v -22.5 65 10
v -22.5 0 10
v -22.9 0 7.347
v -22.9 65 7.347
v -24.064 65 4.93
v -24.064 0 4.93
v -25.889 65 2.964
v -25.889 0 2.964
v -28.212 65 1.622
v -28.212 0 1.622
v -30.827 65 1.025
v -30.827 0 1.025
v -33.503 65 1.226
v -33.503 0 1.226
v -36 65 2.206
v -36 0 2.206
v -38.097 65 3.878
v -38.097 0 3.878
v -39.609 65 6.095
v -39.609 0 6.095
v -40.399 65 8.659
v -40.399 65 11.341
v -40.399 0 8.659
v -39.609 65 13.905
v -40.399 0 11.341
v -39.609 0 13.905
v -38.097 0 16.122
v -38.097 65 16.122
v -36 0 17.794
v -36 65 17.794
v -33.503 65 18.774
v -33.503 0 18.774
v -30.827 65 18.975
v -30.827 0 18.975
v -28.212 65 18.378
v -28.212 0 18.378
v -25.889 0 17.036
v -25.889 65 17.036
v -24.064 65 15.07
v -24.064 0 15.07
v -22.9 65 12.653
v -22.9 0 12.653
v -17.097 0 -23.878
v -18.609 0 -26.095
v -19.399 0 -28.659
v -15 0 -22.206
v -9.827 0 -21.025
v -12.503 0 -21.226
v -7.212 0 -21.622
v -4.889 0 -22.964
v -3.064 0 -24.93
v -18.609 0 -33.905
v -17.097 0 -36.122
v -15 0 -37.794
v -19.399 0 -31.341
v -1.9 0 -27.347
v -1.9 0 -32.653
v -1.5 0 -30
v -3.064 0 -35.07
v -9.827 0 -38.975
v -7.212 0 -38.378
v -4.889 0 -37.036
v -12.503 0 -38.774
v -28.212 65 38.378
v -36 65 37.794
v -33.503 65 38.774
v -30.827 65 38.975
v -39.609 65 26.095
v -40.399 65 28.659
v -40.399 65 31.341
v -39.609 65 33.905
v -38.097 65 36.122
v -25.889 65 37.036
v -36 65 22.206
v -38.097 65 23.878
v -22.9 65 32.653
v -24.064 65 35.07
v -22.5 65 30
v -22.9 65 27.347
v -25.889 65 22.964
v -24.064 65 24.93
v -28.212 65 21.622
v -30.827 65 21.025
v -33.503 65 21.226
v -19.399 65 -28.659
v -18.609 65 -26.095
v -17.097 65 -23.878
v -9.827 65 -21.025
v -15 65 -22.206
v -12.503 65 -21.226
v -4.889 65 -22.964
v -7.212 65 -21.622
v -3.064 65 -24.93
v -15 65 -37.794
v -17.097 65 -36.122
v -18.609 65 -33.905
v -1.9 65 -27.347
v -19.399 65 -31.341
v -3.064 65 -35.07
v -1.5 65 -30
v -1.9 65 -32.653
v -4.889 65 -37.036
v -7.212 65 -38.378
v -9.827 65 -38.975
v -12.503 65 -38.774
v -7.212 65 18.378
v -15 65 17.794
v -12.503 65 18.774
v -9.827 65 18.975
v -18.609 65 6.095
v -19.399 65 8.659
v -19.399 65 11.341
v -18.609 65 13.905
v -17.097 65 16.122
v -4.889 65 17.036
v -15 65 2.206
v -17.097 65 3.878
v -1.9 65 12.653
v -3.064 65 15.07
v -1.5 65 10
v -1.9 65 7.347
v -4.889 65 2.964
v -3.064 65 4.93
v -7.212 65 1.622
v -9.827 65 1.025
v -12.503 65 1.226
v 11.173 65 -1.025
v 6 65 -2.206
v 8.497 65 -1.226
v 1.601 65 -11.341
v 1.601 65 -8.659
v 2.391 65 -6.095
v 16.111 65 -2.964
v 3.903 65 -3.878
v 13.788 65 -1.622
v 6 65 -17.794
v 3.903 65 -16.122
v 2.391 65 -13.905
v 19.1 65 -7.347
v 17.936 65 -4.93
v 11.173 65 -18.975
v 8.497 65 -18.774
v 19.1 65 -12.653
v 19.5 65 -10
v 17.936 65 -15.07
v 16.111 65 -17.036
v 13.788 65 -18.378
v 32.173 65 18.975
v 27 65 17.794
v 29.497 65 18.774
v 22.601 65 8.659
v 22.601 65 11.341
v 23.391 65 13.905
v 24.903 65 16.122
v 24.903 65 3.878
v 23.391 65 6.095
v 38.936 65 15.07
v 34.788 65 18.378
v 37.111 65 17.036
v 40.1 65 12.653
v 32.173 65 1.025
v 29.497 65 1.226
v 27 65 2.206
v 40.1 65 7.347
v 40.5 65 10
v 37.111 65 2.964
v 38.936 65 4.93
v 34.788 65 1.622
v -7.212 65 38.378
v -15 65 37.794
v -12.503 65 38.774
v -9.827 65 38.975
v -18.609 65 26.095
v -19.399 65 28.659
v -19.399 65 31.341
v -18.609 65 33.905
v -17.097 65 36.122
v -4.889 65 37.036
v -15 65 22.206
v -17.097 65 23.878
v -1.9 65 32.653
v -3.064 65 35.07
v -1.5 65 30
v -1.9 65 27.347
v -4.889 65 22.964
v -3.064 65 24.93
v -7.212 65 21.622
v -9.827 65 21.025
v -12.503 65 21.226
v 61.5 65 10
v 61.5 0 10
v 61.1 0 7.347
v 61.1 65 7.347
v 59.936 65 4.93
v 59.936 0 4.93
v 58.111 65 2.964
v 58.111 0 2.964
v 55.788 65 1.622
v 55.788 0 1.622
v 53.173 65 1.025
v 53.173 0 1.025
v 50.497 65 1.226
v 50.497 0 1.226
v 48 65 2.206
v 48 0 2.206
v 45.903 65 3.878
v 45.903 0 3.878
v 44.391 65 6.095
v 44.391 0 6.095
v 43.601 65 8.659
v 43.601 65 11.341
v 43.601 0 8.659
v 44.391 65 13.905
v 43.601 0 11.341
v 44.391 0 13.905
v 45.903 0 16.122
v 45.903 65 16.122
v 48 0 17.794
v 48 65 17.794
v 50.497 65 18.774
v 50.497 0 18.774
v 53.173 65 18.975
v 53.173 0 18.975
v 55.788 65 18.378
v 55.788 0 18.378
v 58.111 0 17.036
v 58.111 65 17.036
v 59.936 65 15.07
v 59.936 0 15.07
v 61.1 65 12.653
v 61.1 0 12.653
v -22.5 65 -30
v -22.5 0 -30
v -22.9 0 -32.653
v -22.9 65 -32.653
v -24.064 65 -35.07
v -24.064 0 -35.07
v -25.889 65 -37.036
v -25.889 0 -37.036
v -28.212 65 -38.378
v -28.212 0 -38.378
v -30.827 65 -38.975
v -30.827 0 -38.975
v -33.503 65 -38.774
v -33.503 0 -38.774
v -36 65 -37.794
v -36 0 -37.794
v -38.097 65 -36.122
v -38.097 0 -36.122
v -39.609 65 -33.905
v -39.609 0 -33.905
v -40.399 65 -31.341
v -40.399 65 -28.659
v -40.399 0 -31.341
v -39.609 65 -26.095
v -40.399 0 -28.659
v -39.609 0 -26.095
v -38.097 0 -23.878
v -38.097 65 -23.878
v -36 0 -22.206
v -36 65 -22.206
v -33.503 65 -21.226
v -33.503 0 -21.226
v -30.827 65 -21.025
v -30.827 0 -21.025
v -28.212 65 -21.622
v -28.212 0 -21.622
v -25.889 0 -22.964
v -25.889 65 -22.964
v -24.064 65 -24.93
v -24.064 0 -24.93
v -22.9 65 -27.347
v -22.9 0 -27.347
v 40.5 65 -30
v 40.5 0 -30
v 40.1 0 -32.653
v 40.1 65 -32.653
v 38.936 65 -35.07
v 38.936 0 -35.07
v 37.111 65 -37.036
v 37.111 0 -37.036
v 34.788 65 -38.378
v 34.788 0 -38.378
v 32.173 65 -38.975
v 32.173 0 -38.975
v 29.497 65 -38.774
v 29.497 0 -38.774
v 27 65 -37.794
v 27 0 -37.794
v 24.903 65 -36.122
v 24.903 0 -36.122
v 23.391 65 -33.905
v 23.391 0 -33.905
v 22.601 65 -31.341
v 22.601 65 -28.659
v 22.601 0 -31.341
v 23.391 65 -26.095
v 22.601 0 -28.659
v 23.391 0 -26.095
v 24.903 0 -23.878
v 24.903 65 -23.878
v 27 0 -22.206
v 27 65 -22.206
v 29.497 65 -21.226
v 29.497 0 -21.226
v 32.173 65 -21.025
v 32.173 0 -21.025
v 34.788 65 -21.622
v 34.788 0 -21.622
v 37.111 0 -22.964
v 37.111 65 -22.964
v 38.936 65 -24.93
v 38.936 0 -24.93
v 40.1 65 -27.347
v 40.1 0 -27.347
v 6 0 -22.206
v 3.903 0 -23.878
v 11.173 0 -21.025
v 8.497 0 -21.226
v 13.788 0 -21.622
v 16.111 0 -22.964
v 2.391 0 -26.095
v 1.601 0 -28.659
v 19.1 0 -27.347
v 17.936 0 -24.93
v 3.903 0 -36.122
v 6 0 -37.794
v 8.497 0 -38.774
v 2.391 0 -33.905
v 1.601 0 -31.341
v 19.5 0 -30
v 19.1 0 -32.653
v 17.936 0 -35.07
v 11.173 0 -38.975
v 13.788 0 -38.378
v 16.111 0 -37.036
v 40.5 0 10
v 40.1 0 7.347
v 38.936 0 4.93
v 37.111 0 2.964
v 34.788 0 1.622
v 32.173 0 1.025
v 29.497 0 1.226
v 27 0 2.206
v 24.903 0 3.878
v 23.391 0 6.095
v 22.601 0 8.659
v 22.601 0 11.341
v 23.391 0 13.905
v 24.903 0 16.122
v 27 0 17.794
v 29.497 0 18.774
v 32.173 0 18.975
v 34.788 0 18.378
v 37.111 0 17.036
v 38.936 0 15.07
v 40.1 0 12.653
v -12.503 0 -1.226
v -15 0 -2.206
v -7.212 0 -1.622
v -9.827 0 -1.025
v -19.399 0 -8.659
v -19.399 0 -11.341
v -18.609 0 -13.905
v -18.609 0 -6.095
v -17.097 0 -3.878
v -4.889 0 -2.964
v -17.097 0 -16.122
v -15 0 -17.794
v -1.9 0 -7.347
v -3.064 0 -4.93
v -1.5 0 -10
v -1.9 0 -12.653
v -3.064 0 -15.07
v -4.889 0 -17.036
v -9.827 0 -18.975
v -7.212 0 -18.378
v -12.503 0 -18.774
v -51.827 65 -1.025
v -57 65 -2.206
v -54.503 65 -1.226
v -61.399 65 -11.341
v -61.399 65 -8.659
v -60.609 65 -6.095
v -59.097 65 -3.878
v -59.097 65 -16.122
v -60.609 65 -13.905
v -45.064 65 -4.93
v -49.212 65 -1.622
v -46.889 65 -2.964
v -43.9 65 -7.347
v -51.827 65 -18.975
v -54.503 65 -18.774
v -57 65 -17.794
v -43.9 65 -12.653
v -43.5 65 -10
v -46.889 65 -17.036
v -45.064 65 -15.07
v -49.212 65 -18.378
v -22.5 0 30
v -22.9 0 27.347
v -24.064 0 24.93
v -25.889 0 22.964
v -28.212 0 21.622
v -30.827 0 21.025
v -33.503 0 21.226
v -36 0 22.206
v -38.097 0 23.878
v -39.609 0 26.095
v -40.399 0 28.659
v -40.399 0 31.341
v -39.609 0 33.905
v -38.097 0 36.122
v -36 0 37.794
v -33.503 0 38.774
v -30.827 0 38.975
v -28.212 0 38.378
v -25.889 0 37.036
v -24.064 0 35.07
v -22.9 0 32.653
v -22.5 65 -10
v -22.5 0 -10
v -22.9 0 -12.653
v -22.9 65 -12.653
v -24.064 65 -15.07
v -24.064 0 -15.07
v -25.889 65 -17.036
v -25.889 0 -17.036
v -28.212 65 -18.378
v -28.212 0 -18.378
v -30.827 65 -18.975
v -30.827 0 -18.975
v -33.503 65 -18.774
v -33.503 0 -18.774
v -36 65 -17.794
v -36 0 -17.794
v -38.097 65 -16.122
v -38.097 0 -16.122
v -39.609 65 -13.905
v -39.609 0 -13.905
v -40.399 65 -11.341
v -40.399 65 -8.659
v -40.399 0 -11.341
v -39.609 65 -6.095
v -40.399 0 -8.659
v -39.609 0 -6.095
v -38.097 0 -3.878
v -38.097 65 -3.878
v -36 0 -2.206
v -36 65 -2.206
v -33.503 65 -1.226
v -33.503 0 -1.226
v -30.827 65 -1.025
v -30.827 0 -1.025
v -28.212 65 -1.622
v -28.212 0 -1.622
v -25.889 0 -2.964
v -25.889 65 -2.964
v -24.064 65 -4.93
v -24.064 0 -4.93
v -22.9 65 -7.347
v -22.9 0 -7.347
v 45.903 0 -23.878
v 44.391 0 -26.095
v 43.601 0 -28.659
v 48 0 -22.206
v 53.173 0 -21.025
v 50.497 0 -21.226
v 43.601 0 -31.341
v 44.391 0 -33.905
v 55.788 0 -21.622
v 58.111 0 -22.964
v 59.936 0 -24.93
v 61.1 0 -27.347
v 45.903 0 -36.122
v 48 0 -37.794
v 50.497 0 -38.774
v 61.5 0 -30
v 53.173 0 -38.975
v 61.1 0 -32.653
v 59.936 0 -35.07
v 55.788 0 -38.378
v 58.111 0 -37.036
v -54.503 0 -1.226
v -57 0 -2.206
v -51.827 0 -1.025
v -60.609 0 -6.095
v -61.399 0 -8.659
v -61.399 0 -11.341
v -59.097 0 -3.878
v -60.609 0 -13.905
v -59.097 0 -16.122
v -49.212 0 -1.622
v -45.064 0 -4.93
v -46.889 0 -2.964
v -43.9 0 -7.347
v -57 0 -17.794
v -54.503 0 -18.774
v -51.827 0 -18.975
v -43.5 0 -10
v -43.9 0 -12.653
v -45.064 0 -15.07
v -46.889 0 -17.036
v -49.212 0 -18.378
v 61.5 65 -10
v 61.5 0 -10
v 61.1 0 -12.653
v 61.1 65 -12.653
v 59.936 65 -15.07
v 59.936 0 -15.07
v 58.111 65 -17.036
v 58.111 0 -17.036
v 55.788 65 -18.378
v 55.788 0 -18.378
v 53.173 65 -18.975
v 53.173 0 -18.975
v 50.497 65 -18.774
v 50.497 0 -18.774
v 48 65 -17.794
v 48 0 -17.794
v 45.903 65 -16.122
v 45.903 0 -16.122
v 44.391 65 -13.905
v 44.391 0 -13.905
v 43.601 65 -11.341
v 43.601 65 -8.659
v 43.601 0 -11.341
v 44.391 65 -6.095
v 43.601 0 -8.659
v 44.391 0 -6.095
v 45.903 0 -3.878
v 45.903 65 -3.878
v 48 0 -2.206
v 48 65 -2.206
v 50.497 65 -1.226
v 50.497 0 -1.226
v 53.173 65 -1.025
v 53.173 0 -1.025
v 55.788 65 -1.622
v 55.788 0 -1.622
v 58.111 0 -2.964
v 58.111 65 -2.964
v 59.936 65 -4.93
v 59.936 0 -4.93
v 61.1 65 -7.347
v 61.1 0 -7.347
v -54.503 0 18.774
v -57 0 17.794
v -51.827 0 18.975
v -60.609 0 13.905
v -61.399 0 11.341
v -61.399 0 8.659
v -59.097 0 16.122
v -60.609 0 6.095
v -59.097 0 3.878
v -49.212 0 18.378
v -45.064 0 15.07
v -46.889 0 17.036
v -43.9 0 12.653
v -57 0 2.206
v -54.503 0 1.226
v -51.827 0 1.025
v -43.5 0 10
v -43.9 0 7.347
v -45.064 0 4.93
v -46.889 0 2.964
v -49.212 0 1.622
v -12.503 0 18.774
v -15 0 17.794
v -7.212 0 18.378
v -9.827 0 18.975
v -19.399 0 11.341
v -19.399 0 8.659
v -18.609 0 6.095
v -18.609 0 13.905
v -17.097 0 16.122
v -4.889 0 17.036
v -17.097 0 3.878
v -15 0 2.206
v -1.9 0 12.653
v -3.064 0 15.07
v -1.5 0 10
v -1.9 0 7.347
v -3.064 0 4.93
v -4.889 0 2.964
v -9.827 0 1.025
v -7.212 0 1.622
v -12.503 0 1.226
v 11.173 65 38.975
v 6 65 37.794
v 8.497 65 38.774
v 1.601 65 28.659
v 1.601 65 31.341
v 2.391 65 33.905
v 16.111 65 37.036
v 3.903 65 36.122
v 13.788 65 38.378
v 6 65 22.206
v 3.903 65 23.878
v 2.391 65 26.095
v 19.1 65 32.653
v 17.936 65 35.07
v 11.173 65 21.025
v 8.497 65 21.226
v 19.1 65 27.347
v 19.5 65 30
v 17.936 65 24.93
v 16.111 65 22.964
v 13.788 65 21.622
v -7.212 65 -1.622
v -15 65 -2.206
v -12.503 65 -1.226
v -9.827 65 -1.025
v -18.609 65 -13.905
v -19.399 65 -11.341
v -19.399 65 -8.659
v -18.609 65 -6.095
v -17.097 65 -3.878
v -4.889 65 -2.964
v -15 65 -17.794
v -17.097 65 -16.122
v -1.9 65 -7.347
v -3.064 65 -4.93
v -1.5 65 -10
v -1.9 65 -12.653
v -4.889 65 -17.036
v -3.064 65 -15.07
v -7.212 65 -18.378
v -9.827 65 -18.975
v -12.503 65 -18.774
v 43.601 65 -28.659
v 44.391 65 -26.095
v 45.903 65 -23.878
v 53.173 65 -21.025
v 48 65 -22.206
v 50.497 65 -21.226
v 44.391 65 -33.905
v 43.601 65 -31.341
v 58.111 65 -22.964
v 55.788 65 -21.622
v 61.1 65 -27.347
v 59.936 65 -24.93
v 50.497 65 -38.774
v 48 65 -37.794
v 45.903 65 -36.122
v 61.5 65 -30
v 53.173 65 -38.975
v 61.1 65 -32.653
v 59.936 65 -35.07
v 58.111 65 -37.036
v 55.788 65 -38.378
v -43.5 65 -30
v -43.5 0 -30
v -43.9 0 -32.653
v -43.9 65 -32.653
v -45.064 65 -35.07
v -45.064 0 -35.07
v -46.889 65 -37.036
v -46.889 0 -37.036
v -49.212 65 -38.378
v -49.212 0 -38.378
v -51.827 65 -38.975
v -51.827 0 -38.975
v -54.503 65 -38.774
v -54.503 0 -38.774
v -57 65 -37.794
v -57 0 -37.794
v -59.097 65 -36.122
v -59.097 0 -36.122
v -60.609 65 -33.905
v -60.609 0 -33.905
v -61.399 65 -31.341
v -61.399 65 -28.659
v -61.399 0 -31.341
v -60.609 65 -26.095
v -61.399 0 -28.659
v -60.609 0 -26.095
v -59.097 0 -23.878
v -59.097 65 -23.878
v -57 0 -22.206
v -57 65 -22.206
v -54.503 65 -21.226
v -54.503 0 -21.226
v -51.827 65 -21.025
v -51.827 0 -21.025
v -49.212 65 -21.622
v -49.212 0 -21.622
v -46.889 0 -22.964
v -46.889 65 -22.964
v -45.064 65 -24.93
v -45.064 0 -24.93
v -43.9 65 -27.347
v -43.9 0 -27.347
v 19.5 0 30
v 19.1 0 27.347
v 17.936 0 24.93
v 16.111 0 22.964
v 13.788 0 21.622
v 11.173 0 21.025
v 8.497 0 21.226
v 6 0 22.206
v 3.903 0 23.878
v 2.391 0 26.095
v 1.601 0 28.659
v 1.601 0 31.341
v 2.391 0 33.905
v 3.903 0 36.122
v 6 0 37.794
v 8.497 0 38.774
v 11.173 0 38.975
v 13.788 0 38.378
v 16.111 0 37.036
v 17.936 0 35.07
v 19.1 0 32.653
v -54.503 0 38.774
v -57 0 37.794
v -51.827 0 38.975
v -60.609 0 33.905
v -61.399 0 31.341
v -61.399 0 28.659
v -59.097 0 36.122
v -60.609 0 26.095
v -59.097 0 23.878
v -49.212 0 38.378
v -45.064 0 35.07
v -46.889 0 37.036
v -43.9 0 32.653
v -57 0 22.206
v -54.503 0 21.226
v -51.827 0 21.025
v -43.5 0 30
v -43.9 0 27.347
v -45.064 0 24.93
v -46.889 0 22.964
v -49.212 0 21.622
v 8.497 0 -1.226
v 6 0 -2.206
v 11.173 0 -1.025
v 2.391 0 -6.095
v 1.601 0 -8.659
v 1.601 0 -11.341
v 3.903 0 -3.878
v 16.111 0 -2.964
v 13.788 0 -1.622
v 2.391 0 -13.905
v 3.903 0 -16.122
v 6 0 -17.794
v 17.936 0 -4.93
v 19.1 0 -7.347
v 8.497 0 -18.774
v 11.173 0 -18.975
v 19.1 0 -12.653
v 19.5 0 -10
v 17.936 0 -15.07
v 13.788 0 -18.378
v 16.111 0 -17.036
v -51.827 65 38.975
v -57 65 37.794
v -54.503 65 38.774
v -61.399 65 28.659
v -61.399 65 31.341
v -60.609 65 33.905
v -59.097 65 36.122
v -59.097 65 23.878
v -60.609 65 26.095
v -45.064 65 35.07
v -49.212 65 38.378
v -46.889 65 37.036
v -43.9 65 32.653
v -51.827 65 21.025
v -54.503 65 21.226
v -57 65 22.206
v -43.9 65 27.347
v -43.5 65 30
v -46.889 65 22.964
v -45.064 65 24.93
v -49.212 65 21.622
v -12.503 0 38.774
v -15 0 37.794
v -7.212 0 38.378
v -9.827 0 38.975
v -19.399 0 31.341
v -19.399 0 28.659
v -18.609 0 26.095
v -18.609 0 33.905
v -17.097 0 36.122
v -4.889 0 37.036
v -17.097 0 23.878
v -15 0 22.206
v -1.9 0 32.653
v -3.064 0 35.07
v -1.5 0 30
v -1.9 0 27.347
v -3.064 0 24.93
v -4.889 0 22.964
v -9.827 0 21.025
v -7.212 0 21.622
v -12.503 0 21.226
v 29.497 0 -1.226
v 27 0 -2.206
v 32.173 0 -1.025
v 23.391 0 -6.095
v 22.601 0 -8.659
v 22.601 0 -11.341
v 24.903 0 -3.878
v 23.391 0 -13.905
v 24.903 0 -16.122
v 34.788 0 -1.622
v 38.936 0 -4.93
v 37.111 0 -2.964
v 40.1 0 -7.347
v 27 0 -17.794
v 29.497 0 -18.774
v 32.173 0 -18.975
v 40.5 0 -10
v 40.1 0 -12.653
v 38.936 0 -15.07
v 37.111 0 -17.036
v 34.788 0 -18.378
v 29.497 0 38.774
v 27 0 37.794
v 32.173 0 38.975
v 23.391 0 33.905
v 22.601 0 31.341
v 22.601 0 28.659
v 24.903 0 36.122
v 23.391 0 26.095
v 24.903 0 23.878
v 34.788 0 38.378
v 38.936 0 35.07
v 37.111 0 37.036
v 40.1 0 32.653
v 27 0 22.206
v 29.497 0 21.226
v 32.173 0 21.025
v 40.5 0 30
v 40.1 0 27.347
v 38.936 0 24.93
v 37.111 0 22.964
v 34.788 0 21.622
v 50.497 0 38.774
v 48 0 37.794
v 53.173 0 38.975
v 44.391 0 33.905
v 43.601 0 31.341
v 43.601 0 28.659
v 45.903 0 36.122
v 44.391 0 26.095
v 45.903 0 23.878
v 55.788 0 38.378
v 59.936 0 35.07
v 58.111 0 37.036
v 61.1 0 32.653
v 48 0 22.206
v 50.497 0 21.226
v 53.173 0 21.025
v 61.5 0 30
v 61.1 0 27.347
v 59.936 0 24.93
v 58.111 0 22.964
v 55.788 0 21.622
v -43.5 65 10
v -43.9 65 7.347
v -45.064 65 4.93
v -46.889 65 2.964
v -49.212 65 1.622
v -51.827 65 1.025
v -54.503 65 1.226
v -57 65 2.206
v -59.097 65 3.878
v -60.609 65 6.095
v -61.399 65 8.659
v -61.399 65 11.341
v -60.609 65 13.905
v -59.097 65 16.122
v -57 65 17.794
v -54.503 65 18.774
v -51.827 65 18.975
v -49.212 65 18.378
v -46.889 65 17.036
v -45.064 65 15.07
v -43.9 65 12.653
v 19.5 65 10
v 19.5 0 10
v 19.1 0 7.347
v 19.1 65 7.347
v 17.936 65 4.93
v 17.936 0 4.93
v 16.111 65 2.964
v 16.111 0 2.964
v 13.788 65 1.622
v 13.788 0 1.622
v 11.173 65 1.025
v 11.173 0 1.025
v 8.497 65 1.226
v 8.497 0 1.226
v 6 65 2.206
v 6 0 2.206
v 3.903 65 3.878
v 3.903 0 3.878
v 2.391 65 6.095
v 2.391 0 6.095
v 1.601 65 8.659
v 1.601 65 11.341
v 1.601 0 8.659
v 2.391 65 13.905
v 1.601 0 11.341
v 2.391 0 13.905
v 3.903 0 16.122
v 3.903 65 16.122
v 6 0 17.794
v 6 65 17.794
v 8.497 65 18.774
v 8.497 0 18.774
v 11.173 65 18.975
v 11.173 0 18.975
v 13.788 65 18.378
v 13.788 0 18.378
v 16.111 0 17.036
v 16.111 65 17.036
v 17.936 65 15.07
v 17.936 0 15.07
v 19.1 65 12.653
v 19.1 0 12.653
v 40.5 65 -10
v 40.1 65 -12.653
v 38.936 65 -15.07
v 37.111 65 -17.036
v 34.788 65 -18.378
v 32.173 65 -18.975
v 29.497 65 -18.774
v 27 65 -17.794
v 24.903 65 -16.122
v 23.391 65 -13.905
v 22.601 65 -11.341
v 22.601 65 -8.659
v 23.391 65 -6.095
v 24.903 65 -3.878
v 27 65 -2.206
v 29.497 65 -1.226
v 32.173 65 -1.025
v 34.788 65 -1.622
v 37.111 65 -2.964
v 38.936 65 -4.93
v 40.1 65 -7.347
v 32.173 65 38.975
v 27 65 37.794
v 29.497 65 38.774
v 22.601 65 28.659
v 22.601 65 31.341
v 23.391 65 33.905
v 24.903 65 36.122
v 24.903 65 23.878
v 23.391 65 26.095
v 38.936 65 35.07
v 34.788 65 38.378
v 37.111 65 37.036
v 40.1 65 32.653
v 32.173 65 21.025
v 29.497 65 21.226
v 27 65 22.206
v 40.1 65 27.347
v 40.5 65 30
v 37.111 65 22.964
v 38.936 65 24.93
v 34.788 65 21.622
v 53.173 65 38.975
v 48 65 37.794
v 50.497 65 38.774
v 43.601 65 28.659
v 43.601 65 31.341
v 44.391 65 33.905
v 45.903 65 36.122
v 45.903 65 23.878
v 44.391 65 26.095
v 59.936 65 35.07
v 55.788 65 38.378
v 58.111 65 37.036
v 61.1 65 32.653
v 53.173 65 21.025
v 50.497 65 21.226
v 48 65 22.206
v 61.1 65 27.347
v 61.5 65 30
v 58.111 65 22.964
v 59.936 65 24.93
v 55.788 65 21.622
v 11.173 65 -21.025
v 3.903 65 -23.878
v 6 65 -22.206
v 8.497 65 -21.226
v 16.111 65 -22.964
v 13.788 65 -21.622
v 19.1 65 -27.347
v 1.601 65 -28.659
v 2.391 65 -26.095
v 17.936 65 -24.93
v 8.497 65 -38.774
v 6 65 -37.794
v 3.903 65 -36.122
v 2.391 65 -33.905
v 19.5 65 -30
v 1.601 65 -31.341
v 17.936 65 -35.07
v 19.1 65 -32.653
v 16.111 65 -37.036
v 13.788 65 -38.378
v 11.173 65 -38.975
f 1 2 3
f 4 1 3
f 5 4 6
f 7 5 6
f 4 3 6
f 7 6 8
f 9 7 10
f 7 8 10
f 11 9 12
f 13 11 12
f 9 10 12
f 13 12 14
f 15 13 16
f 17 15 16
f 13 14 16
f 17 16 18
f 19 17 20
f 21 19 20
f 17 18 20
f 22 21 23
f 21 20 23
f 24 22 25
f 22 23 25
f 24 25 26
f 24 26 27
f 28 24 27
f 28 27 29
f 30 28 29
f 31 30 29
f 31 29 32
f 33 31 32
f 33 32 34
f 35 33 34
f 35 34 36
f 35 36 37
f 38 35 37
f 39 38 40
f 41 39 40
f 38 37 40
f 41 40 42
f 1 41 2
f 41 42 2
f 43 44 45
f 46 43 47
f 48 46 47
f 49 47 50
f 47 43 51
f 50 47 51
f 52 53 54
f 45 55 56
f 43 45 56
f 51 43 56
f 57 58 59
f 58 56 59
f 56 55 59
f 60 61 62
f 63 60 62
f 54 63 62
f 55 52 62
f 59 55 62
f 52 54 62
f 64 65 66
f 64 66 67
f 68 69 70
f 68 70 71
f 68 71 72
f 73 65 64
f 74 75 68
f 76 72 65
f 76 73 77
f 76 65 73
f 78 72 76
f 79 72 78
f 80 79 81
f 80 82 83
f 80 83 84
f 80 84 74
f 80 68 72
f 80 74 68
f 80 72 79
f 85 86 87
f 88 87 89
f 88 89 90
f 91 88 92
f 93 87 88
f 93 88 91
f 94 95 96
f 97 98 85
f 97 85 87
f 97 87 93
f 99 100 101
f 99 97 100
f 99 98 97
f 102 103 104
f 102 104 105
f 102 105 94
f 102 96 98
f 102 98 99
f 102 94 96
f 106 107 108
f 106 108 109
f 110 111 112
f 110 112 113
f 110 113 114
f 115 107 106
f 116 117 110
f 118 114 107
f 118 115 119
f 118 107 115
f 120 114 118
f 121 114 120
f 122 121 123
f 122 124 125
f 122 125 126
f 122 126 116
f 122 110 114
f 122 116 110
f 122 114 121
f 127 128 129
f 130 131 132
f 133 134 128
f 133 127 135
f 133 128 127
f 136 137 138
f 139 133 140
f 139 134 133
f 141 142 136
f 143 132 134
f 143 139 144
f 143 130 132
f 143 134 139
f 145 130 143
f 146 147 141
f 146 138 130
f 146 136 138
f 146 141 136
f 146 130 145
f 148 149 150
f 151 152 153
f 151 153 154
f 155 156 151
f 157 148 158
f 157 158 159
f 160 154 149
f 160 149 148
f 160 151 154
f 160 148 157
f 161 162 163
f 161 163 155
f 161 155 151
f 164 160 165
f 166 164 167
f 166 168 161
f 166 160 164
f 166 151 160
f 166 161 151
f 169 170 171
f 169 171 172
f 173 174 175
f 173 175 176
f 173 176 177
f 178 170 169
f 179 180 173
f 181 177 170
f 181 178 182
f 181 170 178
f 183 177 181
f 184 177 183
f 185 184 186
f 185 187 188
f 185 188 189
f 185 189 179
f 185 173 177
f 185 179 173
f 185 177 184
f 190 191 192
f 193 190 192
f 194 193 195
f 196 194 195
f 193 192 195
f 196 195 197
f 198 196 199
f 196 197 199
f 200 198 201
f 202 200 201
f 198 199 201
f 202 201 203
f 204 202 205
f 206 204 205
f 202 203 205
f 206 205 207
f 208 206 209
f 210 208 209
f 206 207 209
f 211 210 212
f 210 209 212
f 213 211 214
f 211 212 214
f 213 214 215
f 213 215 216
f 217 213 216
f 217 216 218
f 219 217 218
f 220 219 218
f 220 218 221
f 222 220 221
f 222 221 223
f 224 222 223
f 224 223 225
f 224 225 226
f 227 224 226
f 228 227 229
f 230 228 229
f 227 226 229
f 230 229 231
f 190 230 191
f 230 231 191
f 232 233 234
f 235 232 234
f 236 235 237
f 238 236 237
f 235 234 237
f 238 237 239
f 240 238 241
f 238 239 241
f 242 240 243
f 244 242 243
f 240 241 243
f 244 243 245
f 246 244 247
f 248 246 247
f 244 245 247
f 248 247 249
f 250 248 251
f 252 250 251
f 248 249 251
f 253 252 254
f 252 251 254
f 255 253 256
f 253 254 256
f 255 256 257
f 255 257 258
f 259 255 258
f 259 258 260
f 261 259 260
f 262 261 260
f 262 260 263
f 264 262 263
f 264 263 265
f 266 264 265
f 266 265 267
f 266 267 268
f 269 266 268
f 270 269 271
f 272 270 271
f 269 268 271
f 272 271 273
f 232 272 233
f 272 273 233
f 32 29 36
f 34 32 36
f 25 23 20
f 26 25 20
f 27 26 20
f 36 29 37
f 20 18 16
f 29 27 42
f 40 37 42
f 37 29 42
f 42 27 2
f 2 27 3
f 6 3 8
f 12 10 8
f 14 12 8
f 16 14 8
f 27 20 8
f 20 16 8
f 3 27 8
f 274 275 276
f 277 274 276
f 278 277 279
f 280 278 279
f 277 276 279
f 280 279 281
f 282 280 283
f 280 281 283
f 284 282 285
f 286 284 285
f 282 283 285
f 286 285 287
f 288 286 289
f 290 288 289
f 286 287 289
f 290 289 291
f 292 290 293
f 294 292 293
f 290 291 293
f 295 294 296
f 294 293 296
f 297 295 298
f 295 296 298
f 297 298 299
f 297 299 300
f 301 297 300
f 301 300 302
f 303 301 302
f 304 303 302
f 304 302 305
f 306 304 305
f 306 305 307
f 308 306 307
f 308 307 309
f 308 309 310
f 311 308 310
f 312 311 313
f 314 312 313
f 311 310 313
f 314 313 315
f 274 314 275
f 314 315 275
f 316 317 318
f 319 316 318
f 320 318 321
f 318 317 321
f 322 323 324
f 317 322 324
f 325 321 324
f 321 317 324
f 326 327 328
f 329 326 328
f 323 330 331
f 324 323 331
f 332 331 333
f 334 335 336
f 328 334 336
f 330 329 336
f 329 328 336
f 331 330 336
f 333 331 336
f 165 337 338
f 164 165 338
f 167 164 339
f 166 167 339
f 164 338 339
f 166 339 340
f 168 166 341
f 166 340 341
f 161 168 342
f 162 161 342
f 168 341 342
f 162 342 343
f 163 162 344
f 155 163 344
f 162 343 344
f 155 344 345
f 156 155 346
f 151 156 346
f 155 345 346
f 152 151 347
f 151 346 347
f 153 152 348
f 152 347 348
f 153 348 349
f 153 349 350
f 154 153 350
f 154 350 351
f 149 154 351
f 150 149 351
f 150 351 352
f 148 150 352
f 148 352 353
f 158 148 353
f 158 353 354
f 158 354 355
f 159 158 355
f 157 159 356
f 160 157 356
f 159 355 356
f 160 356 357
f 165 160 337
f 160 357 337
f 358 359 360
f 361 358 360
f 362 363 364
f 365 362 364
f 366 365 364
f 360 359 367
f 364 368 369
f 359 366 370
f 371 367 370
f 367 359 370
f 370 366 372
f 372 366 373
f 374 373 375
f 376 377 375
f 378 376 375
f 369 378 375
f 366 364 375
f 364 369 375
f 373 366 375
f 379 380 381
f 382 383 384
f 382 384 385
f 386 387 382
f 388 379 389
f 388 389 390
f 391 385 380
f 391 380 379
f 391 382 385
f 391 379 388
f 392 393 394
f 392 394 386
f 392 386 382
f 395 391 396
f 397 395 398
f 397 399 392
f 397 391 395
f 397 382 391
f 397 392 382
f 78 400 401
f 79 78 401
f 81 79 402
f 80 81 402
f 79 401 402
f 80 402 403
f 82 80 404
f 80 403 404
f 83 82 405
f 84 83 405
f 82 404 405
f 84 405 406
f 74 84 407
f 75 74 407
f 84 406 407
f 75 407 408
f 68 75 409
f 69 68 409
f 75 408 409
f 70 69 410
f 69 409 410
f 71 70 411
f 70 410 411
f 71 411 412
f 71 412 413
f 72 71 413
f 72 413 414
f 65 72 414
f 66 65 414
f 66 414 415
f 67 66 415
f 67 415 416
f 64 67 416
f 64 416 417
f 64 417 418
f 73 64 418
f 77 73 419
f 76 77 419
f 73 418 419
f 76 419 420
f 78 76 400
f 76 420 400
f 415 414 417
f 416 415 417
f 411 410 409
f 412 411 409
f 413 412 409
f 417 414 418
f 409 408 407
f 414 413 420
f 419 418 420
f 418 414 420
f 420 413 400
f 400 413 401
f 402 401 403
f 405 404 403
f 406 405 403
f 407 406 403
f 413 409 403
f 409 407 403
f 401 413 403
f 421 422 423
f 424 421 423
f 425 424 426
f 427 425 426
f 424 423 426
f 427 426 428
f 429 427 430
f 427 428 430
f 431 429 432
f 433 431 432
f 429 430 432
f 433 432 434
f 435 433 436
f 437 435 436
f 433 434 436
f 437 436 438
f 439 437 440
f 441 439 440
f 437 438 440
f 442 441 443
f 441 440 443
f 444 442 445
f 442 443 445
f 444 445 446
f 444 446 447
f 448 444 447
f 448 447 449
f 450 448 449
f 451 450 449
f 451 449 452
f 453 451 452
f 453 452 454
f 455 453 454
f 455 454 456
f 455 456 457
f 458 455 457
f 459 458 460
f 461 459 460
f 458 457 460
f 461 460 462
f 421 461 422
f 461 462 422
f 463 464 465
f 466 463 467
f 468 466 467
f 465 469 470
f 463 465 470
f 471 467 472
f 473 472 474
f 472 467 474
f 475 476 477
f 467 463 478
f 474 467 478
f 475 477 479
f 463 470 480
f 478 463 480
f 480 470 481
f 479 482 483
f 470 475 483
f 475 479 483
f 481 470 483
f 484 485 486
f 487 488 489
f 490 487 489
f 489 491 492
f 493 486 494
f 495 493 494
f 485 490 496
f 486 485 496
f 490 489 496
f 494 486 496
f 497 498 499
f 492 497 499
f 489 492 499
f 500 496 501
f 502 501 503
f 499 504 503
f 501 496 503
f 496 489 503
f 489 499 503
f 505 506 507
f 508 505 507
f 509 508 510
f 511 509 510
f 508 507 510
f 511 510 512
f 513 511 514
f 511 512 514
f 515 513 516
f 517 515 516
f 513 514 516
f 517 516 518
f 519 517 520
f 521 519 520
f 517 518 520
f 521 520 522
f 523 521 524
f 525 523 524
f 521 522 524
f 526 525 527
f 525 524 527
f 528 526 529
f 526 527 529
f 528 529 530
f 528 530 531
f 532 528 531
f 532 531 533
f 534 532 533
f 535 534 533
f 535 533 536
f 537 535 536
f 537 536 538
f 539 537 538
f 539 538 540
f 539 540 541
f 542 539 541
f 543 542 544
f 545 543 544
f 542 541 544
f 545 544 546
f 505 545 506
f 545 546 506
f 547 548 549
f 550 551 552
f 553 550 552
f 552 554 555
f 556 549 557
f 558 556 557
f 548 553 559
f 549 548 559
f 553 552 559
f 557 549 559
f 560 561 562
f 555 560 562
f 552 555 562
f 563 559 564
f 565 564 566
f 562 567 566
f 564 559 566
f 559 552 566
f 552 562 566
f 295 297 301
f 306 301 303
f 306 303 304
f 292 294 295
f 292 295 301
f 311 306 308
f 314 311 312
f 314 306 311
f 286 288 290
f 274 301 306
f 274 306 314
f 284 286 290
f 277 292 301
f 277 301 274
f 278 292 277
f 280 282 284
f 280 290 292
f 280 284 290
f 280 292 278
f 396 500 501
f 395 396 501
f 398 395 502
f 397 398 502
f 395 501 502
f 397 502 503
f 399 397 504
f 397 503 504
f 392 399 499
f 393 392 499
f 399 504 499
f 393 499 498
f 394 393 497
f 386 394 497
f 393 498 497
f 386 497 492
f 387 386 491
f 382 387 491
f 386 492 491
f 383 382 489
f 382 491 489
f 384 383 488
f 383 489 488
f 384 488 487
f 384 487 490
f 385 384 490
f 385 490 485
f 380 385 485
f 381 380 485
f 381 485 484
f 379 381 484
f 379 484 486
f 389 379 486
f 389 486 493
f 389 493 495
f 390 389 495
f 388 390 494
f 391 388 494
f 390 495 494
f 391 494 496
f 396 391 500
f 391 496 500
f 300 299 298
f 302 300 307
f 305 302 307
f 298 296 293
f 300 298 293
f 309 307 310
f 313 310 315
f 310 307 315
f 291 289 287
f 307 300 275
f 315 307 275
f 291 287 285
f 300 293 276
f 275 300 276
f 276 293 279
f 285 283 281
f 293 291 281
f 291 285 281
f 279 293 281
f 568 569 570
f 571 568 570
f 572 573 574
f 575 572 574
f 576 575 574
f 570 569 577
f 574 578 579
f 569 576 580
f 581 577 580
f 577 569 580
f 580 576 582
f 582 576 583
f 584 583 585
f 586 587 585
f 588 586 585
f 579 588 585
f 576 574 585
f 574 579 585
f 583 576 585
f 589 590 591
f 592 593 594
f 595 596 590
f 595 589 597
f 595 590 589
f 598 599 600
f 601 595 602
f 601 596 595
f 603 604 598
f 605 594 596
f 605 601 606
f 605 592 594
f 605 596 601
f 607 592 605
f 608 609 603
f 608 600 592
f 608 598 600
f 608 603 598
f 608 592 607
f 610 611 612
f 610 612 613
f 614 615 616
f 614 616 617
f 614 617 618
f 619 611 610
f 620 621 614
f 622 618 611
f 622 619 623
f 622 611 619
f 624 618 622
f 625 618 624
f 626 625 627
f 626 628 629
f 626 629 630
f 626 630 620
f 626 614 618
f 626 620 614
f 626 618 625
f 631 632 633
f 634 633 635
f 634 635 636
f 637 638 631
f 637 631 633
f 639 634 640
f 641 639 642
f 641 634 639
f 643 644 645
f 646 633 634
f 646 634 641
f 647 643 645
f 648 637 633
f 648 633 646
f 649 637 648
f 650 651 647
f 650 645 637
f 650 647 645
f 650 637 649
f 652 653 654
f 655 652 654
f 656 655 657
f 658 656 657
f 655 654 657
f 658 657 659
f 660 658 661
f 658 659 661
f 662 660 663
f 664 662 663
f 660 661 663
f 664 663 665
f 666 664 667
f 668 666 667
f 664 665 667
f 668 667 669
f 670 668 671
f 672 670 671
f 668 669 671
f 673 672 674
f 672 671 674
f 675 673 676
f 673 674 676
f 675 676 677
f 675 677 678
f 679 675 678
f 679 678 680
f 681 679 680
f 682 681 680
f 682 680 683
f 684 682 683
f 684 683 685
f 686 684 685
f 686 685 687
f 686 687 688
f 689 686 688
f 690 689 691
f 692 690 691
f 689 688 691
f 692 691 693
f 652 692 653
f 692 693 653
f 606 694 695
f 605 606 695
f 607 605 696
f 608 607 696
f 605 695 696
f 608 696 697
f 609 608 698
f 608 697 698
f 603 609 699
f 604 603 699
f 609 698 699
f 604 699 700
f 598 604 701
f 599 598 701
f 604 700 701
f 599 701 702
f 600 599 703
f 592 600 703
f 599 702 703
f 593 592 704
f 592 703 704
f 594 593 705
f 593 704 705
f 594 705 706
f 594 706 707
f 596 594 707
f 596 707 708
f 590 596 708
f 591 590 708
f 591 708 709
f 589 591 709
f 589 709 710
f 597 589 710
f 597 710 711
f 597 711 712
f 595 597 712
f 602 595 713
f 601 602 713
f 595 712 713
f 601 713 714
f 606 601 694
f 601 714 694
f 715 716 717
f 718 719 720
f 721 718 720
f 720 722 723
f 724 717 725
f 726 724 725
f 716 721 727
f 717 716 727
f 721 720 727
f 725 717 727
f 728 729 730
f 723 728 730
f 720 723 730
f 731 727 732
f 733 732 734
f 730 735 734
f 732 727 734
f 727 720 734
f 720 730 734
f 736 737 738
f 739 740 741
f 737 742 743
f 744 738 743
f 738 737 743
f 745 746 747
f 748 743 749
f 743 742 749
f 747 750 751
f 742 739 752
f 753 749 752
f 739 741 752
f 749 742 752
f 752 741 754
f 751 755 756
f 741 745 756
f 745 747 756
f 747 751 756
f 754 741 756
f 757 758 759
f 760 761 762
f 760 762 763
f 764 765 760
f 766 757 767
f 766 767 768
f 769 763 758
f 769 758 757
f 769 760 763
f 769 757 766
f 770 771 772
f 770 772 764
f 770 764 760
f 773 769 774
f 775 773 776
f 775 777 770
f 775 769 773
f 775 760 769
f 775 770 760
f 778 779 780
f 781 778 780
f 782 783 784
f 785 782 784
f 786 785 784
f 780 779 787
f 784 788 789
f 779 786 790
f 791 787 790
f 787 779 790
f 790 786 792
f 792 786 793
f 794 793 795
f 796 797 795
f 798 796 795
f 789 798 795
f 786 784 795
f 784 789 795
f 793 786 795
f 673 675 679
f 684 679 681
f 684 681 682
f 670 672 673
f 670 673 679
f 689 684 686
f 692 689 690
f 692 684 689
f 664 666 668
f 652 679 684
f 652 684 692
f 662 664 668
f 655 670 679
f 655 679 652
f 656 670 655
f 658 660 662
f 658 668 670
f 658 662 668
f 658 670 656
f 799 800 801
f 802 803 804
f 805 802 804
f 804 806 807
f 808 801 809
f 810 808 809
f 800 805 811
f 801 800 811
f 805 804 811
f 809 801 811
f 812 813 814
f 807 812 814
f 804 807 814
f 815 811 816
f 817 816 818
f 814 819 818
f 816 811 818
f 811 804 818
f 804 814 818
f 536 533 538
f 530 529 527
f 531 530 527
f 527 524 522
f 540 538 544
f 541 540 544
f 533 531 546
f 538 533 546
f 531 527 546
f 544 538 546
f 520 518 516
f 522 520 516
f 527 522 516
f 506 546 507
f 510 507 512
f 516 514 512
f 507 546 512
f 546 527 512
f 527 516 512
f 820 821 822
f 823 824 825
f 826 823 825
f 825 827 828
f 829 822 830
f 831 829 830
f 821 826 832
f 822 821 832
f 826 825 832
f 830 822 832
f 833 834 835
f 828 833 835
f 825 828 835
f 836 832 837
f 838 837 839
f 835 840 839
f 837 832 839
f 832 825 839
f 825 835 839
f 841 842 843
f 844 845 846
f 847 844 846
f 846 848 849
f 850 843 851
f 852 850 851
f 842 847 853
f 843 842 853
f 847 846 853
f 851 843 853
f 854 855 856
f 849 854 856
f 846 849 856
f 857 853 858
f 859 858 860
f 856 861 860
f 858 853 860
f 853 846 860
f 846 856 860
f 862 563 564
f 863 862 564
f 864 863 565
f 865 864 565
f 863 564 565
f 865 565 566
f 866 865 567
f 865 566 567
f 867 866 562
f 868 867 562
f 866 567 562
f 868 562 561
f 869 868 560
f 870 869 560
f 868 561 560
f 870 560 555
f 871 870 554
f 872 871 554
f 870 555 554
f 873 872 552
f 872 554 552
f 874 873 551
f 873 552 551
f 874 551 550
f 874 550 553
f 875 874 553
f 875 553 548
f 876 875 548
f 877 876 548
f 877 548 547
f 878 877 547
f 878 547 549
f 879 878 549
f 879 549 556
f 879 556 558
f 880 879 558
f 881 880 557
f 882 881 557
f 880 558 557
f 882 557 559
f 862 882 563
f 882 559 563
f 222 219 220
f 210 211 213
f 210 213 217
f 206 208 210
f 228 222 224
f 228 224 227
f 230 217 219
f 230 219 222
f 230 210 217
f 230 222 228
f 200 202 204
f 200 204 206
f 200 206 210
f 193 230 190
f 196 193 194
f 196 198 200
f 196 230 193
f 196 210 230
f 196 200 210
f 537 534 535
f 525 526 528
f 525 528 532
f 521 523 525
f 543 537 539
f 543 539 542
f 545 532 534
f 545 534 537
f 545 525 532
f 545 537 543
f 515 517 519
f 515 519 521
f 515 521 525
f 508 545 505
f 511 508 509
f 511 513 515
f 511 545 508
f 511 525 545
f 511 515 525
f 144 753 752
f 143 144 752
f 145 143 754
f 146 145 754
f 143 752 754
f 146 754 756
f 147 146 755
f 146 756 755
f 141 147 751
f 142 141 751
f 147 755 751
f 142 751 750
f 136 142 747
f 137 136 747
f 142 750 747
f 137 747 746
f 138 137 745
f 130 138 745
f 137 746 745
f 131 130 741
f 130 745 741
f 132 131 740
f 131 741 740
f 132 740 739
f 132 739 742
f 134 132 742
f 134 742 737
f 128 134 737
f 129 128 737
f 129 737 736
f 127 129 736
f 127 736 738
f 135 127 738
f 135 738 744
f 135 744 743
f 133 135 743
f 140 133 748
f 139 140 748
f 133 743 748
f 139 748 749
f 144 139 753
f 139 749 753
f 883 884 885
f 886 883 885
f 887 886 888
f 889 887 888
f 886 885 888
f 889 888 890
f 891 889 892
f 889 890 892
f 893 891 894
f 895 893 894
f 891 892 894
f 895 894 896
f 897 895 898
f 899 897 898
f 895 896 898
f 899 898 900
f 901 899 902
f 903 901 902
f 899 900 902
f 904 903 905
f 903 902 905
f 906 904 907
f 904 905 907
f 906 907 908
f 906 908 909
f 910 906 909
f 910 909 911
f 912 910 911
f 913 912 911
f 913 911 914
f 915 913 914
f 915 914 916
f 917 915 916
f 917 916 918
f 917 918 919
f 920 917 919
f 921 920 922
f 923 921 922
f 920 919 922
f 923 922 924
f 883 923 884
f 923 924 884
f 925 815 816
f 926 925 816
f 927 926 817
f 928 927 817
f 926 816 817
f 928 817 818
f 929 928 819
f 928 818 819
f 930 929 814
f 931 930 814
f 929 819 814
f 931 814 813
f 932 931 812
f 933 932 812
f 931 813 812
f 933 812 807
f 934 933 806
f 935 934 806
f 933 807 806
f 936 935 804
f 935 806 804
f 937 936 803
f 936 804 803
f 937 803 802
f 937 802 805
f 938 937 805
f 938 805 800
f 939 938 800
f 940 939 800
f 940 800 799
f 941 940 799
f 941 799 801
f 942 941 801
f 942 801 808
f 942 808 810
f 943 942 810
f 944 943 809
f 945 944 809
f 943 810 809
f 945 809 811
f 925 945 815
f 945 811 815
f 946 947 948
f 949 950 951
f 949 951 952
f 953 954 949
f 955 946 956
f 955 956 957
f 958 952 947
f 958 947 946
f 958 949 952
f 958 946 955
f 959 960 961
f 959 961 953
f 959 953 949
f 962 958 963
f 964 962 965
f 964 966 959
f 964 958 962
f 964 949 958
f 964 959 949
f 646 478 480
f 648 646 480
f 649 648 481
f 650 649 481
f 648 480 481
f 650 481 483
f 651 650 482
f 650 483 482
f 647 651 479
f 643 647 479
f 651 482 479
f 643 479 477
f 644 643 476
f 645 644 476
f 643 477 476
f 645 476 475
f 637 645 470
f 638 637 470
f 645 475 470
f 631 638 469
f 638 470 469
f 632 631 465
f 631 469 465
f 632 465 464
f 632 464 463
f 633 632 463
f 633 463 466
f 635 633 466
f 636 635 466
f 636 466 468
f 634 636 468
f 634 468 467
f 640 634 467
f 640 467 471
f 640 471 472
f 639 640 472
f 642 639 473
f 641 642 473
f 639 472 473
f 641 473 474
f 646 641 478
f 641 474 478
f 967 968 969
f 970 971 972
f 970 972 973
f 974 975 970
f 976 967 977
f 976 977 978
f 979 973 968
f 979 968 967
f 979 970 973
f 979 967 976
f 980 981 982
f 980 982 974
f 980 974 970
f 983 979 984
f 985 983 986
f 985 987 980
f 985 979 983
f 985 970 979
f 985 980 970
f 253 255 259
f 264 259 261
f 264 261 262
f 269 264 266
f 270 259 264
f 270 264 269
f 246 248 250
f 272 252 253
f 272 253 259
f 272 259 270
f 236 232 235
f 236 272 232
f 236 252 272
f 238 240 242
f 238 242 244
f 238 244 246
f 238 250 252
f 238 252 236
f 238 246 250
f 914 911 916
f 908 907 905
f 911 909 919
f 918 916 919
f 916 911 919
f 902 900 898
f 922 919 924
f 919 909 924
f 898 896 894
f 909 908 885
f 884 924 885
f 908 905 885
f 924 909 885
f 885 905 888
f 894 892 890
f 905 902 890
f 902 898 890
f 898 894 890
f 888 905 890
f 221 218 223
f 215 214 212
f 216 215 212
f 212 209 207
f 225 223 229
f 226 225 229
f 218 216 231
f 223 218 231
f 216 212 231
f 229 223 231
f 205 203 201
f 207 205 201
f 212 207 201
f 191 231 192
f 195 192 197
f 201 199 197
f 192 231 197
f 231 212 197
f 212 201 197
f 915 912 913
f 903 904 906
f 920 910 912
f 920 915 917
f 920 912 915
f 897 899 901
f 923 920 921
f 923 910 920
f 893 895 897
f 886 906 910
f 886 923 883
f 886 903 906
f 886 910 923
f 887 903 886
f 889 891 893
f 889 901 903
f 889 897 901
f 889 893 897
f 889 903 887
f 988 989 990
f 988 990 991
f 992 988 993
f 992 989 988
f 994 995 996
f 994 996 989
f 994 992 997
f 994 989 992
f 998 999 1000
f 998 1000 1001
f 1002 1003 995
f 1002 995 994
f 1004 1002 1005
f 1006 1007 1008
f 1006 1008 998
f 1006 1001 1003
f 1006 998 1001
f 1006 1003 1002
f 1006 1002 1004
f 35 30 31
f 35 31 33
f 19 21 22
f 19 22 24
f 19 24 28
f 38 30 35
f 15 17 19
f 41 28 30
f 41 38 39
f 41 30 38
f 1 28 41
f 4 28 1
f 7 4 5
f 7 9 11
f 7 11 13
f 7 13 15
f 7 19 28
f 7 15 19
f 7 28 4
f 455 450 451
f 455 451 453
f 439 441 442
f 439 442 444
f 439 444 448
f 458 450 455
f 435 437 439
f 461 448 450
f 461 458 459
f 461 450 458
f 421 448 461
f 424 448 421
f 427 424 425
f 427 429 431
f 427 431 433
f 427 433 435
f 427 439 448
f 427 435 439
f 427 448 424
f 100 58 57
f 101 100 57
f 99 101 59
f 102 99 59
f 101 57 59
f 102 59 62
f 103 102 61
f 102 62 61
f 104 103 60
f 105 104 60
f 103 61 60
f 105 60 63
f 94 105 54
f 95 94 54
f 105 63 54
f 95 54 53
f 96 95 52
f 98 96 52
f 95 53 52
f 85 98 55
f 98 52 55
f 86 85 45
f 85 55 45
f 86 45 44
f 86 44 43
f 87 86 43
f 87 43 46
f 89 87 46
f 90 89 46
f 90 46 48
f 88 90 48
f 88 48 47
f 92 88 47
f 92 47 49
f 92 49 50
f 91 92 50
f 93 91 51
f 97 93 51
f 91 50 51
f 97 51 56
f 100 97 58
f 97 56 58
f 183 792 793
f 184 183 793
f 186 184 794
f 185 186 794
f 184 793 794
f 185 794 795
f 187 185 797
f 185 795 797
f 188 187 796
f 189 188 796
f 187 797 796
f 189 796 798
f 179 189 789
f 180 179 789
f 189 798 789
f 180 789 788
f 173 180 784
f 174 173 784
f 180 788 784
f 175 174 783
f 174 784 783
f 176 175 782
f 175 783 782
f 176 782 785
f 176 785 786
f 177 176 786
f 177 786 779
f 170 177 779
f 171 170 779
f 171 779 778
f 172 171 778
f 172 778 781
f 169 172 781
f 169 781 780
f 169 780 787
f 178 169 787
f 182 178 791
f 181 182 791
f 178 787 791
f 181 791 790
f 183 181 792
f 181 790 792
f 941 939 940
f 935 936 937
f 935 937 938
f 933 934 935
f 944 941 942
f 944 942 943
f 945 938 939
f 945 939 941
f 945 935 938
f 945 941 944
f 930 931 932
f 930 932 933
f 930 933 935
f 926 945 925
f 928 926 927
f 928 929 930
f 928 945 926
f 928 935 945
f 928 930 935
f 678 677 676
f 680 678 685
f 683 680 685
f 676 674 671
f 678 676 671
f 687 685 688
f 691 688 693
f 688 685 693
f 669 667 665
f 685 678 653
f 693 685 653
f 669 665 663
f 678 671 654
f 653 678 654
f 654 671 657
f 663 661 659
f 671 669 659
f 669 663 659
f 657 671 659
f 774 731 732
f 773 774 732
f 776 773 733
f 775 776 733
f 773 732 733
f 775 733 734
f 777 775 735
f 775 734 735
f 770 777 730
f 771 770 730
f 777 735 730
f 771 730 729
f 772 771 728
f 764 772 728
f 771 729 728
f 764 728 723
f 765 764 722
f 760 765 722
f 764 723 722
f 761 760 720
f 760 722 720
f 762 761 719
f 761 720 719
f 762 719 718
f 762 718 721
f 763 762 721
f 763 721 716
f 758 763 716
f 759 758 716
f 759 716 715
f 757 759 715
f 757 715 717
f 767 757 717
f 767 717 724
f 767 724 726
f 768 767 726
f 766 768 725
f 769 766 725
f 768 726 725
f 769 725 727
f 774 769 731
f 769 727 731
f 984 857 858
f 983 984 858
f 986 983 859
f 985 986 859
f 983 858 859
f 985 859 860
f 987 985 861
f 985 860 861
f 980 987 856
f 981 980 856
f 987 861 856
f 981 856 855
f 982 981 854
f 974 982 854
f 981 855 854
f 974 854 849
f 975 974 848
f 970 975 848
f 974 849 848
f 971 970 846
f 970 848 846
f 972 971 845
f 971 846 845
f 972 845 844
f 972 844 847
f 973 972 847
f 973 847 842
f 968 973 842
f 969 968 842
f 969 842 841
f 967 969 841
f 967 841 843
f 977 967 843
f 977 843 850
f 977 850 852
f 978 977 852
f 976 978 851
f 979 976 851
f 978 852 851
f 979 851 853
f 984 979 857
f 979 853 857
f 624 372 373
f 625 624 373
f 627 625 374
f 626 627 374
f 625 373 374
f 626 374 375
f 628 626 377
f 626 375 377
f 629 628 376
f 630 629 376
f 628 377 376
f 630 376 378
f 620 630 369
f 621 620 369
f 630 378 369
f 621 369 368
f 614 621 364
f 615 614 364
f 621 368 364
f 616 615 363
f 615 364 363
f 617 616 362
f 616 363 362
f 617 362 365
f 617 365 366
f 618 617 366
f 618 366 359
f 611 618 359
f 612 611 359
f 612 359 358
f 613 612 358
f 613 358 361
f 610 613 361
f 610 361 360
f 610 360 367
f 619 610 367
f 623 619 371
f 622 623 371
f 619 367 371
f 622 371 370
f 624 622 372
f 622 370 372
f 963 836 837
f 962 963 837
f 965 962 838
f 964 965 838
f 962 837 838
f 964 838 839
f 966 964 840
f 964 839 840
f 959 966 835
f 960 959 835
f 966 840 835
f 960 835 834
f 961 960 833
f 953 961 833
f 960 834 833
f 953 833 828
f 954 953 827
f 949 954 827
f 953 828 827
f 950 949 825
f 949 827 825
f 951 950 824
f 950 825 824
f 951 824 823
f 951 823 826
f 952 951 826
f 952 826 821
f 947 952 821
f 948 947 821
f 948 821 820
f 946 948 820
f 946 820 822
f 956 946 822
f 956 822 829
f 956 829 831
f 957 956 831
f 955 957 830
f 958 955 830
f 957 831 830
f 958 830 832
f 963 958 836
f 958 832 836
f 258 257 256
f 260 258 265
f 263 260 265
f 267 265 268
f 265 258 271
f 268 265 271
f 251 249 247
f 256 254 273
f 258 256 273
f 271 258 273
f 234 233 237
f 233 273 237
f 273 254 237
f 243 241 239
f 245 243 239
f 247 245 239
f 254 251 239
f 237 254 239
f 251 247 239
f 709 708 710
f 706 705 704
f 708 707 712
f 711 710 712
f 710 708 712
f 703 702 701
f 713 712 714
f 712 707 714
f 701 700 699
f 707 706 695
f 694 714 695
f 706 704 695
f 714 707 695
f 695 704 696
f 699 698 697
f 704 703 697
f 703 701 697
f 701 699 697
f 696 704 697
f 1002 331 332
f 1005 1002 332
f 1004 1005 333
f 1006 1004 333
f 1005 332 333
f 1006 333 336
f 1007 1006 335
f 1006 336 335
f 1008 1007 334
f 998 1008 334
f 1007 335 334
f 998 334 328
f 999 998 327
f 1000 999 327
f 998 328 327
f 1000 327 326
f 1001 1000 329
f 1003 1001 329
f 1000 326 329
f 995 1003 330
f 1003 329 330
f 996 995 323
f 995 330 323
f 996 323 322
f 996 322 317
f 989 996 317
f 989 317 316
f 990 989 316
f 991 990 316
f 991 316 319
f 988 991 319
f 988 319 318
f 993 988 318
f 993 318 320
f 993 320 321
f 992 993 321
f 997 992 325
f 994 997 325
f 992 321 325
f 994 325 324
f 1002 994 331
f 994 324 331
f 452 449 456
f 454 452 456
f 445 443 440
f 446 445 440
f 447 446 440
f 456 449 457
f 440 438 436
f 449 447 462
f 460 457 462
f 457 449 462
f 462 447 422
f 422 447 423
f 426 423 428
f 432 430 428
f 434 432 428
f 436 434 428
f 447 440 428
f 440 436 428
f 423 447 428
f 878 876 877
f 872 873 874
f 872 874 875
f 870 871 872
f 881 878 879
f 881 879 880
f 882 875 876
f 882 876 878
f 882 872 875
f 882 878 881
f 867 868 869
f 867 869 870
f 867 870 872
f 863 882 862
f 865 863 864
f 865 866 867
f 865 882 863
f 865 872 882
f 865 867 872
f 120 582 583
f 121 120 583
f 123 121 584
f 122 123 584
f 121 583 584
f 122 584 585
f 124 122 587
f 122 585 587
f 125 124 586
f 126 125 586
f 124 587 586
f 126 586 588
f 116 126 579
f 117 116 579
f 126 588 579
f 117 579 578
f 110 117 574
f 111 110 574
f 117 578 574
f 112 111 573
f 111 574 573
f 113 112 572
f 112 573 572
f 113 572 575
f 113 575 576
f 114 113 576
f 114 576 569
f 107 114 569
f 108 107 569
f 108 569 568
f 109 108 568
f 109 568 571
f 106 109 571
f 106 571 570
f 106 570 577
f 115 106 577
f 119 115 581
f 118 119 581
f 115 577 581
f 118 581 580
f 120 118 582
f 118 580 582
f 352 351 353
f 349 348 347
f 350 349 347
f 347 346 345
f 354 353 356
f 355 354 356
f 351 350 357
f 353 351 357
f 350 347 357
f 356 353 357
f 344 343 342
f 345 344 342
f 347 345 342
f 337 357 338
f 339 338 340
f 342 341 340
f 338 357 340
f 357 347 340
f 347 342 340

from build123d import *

# Parameters (mm, degrees)
SKETCH2_R              = 9
BOSS_EXTRUDE1_DEPTH    = 65
BOSS_EXTRUDE1_2_DEPTH  = 65
BOSS_EXTRUDE1_3_DEPTH  = 65
BOSS_EXTRUDE1_4_DEPTH  = 65
BOSS_EXTRUDE1_5_DEPTH  = 65
BOSS_EXTRUDE1_6_DEPTH  = 65
BOSS_EXTRUDE1_7_DEPTH  = 65
BOSS_EXTRUDE1_8_DEPTH  = 65
BOSS_EXTRUDE1_9_DEPTH  = 65
BOSS_EXTRUDE1_10_DEPTH = 65
BOSS_EXTRUDE1_11_DEPTH = 65
BOSS_EXTRUDE1_12_DEPTH = 65
BOSS_EXTRUDE1_13_DEPTH = 65
BOSS_EXTRUDE1_14_DEPTH = 65
BOSS_EXTRUDE1_15_DEPTH = 65
BOSS_EXTRUDE1_16_DEPTH = 65
BOSS_EXTRUDE1_17_DEPTH = 65
BOSS_EXTRUDE1_18_DEPTH = 65
BOSS_EXTRUDE1_19_DEPTH = 65
BOSS_EXTRUDE1_20_DEPTH = 65
BOSS_EXTRUDE1_21_DEPTH = 65
BOSS_EXTRUDE1_22_DEPTH = 65
BOSS_EXTRUDE1_23_DEPTH = 65
BOSS_EXTRUDE1_24_DEPTH = 65


with BuildPart() as part:
    # Sketch2 → Boss-Extrude1 (new body)
    with BuildSketch(Plane(origin=(0, 0, 0), x_dir=(1, 0, 0), z_dir=(0, 1, 0))):
        with Locations((-10.5, -10)):
            Circle(SKETCH2_R)
    extrude(amount=BOSS_EXTRUDE1_DEPTH)


with BuildPart() as body_2:
    # Sketch2 → Boss-Extrude1 2 (new body)
    with BuildSketch(Plane(origin=(0, 0, 0), x_dir=(1, 0, 0), z_dir=(0, 1, 0))):
        with Locations((10.5, -10)):
            Circle(SKETCH2_R)
    extrude(amount=BOSS_EXTRUDE1_2_DEPTH)


with BuildPart() as body_3:
    # Sketch2 → Boss-Extrude1 3 (new body)
    with BuildSketch(Plane(origin=(0, 0, 0), x_dir=(1, 0, 0), z_dir=(0, 1, 0))):
        with Locations((31.5, -10)):
            Circle(SKETCH2_R)
    extrude(amount=BOSS_EXTRUDE1_3_DEPTH)


with BuildPart() as body_4:
    # Sketch2 → Boss-Extrude1 4 (new body)
    with BuildSketch(Plane(origin=(0, 0, 0), x_dir=(1, 0, 0), z_dir=(0, 1, 0))):
        with Locations((52.5, -10)):
            Circle(SKETCH2_R)
    extrude(amount=BOSS_EXTRUDE1_4_DEPTH)


with BuildPart() as body_5:
    # Sketch2 → Boss-Extrude1 5 (new body)
    with BuildSketch(Plane(origin=(0, 0, 0), x_dir=(1, 0, 0), z_dir=(0, 1, 0))):
        with Locations((10.5, 10)):
            Circle(SKETCH2_R)
    extrude(amount=BOSS_EXTRUDE1_5_DEPTH)


with BuildPart() as body_6:
    # Sketch2 → Boss-Extrude1 6 (new body)
    with BuildSketch(Plane(origin=(0, 0, 0), x_dir=(1, 0, 0), z_dir=(0, 1, 0))):
        with Locations((31.5, 10)):
            Circle(SKETCH2_R)
    extrude(amount=BOSS_EXTRUDE1_6_DEPTH)


with BuildPart() as body_7:
    # Sketch2 → Boss-Extrude1 7 (new body)
    with BuildSketch(Plane(origin=(0, 0, 0), x_dir=(1, 0, 0), z_dir=(0, 1, 0))):
        with Locations((52.5, 10)):
            Circle(SKETCH2_R)
    extrude(amount=BOSS_EXTRUDE1_7_DEPTH)


with BuildPart() as body_8:
    # Sketch2 → Boss-Extrude1 8 (new body)
    with BuildSketch(Plane(origin=(0, 0, 0), x_dir=(1, 0, 0), z_dir=(0, 1, 0))):
        with Locations((10.5, 30)):
            Circle(SKETCH2_R)
    extrude(amount=BOSS_EXTRUDE1_8_DEPTH)


with BuildPart() as body_9:
    # Sketch2 → Boss-Extrude1 9 (new body)
    with BuildSketch(Plane(origin=(0, 0, 0), x_dir=(1, 0, 0), z_dir=(0, 1, 0))):
        with Locations((31.5, 30)):
            Circle(SKETCH2_R)
    extrude(amount=BOSS_EXTRUDE1_9_DEPTH)


with BuildPart() as body_10:
    # Sketch2 → Boss-Extrude1 10 (new body)
    with BuildSketch(Plane(origin=(0, 0, 0), x_dir=(1, 0, 0), z_dir=(0, 1, 0))):
        with Locations((52.5, 30)):
            Circle(SKETCH2_R)
    extrude(amount=BOSS_EXTRUDE1_10_DEPTH)


with BuildPart() as body_11:
    # Sketch2 → Boss-Extrude1 11 (new body)
    with BuildSketch(Plane(origin=(0, 0, 0), x_dir=(1, 0, 0), z_dir=(0, 1, 0))):
        with Locations((-10.5, 10)):
            Circle(SKETCH2_R)
    extrude(amount=BOSS_EXTRUDE1_11_DEPTH)


with BuildPart() as body_12:
    # Sketch2 → Boss-Extrude1 12 (new body)
    with BuildSketch(Plane(origin=(0, 0, 0), x_dir=(1, 0, 0), z_dir=(0, 1, 0))):
        with Locations((-10.5, 30)):
            Circle(SKETCH2_R)
    extrude(amount=BOSS_EXTRUDE1_12_DEPTH)


with BuildPart() as body_13:
    # Sketch2 → Boss-Extrude1 13 (new body)
    with BuildSketch(Plane(origin=(0, 0, 0), x_dir=(1, 0, 0), z_dir=(0, 1, 0))):
        with Locations((-10.5, -30)):
            Circle(SKETCH2_R)
    extrude(amount=BOSS_EXTRUDE1_13_DEPTH)


with BuildPart() as body_14:
    # Sketch2 → Boss-Extrude1 14 (new body)
    with BuildSketch(Plane(origin=(0, 0, 0), x_dir=(1, 0, 0), z_dir=(0, 1, 0))):
        with Locations((52.5, -30)):
            Circle(SKETCH2_R)
    extrude(amount=BOSS_EXTRUDE1_14_DEPTH)


with BuildPart() as body_15:
    # Sketch2 → Boss-Extrude1 15 (new body)
    with BuildSketch(Plane(origin=(0, 0, 0), x_dir=(1, 0, 0), z_dir=(0, 1, 0))):
        with Locations((31.5, -30)):
            Circle(SKETCH2_R)
    extrude(amount=BOSS_EXTRUDE1_15_DEPTH)


with BuildPart() as body_16:
    # Sketch2 → Boss-Extrude1 16 (new body)
    with BuildSketch(Plane(origin=(0, 0, 0), x_dir=(1, 0, 0), z_dir=(0, 1, 0))):
        with Locations((10.5, -30)):
            Circle(SKETCH2_R)
    extrude(amount=BOSS_EXTRUDE1_16_DEPTH)


with BuildPart() as body_17:
    # Sketch2 → Boss-Extrude1 17 (new body)
    with BuildSketch(Plane(origin=(0, 0, 0), x_dir=(1, 0, 0), z_dir=(0, 1, 0))):
        with Locations((-52.5, -30)):
            Circle(SKETCH2_R)
    extrude(amount=BOSS_EXTRUDE1_17_DEPTH)


with BuildPart() as body_18:
    # Sketch2 → Boss-Extrude1 18 (new body)
    with BuildSketch(Plane(origin=(0, 0, 0), x_dir=(1, 0, 0), z_dir=(0, 1, 0))):
        with Locations((-52.5, -10)):
            Circle(SKETCH2_R)
    extrude(amount=BOSS_EXTRUDE1_18_DEPTH)


with BuildPart() as body_19:
    # Sketch2 → Boss-Extrude1 19 (new body)
    with BuildSketch(Plane(origin=(0, 0, 0), x_dir=(1, 0, 0), z_dir=(0, 1, 0))):
        with Locations((-52.5, 10)):
            Circle(SKETCH2_R)
    extrude(amount=BOSS_EXTRUDE1_19_DEPTH)


with BuildPart() as body_20:
    # Sketch2 → Boss-Extrude1 20 (new body)
    with BuildSketch(Plane(origin=(0, 0, 0), x_dir=(1, 0, 0), z_dir=(0, 1, 0))):
        with Locations((-52.5, 30)):
            Circle(SKETCH2_R)
    extrude(amount=BOSS_EXTRUDE1_20_DEPTH)


with BuildPart() as body_21:
    # Sketch2 → Boss-Extrude1 21 (new body)
    with BuildSketch(Plane(origin=(0, 0, 0), x_dir=(1, 0, 0), z_dir=(0, 1, 0))):
        with Locations((-31.5, -30)):
            Circle(SKETCH2_R)
    extrude(amount=BOSS_EXTRUDE1_21_DEPTH)


with BuildPart() as body_22:
    # Sketch2 → Boss-Extrude1 22 (new body)
    with BuildSketch(Plane(origin=(0, 0, 0), x_dir=(1, 0, 0), z_dir=(0, 1, 0))):
        with Locations((-31.5, -10)):
            Circle(SKETCH2_R)
    extrude(amount=BOSS_EXTRUDE1_22_DEPTH)


with BuildPart() as body_23:
    # Sketch2 → Boss-Extrude1 23 (new body)
    with BuildSketch(Plane(origin=(0, 0, 0), x_dir=(1, 0, 0), z_dir=(0, 1, 0))):
        with Locations((-31.5, 10)):
            Circle(SKETCH2_R)
    extrude(amount=BOSS_EXTRUDE1_23_DEPTH)


with BuildPart() as body_24:
    # Sketch2 → Boss-Extrude1 24 (new body)
    with BuildSketch(Plane(origin=(0, 0, 0), x_dir=(1, 0, 0), z_dir=(0, 1, 0))):
        with Locations((-31.5, 30)):
            Circle(SKETCH2_R)
    extrude(amount=BOSS_EXTRUDE1_24_DEPTH)


solid = Compound([part.part, body_2.part, body_3.part, body_4.part, body_5.part, body_6.part, body_7.part, body_8.part, body_9.part, body_10.part, body_11.part, body_12.part, body_13.part, body_14.part, body_15.part, body_16.part, body_17.part, body_18.part, body_19.part, body_20.part, body_21.part, body_22.part, body_23.part, body_24.part])
